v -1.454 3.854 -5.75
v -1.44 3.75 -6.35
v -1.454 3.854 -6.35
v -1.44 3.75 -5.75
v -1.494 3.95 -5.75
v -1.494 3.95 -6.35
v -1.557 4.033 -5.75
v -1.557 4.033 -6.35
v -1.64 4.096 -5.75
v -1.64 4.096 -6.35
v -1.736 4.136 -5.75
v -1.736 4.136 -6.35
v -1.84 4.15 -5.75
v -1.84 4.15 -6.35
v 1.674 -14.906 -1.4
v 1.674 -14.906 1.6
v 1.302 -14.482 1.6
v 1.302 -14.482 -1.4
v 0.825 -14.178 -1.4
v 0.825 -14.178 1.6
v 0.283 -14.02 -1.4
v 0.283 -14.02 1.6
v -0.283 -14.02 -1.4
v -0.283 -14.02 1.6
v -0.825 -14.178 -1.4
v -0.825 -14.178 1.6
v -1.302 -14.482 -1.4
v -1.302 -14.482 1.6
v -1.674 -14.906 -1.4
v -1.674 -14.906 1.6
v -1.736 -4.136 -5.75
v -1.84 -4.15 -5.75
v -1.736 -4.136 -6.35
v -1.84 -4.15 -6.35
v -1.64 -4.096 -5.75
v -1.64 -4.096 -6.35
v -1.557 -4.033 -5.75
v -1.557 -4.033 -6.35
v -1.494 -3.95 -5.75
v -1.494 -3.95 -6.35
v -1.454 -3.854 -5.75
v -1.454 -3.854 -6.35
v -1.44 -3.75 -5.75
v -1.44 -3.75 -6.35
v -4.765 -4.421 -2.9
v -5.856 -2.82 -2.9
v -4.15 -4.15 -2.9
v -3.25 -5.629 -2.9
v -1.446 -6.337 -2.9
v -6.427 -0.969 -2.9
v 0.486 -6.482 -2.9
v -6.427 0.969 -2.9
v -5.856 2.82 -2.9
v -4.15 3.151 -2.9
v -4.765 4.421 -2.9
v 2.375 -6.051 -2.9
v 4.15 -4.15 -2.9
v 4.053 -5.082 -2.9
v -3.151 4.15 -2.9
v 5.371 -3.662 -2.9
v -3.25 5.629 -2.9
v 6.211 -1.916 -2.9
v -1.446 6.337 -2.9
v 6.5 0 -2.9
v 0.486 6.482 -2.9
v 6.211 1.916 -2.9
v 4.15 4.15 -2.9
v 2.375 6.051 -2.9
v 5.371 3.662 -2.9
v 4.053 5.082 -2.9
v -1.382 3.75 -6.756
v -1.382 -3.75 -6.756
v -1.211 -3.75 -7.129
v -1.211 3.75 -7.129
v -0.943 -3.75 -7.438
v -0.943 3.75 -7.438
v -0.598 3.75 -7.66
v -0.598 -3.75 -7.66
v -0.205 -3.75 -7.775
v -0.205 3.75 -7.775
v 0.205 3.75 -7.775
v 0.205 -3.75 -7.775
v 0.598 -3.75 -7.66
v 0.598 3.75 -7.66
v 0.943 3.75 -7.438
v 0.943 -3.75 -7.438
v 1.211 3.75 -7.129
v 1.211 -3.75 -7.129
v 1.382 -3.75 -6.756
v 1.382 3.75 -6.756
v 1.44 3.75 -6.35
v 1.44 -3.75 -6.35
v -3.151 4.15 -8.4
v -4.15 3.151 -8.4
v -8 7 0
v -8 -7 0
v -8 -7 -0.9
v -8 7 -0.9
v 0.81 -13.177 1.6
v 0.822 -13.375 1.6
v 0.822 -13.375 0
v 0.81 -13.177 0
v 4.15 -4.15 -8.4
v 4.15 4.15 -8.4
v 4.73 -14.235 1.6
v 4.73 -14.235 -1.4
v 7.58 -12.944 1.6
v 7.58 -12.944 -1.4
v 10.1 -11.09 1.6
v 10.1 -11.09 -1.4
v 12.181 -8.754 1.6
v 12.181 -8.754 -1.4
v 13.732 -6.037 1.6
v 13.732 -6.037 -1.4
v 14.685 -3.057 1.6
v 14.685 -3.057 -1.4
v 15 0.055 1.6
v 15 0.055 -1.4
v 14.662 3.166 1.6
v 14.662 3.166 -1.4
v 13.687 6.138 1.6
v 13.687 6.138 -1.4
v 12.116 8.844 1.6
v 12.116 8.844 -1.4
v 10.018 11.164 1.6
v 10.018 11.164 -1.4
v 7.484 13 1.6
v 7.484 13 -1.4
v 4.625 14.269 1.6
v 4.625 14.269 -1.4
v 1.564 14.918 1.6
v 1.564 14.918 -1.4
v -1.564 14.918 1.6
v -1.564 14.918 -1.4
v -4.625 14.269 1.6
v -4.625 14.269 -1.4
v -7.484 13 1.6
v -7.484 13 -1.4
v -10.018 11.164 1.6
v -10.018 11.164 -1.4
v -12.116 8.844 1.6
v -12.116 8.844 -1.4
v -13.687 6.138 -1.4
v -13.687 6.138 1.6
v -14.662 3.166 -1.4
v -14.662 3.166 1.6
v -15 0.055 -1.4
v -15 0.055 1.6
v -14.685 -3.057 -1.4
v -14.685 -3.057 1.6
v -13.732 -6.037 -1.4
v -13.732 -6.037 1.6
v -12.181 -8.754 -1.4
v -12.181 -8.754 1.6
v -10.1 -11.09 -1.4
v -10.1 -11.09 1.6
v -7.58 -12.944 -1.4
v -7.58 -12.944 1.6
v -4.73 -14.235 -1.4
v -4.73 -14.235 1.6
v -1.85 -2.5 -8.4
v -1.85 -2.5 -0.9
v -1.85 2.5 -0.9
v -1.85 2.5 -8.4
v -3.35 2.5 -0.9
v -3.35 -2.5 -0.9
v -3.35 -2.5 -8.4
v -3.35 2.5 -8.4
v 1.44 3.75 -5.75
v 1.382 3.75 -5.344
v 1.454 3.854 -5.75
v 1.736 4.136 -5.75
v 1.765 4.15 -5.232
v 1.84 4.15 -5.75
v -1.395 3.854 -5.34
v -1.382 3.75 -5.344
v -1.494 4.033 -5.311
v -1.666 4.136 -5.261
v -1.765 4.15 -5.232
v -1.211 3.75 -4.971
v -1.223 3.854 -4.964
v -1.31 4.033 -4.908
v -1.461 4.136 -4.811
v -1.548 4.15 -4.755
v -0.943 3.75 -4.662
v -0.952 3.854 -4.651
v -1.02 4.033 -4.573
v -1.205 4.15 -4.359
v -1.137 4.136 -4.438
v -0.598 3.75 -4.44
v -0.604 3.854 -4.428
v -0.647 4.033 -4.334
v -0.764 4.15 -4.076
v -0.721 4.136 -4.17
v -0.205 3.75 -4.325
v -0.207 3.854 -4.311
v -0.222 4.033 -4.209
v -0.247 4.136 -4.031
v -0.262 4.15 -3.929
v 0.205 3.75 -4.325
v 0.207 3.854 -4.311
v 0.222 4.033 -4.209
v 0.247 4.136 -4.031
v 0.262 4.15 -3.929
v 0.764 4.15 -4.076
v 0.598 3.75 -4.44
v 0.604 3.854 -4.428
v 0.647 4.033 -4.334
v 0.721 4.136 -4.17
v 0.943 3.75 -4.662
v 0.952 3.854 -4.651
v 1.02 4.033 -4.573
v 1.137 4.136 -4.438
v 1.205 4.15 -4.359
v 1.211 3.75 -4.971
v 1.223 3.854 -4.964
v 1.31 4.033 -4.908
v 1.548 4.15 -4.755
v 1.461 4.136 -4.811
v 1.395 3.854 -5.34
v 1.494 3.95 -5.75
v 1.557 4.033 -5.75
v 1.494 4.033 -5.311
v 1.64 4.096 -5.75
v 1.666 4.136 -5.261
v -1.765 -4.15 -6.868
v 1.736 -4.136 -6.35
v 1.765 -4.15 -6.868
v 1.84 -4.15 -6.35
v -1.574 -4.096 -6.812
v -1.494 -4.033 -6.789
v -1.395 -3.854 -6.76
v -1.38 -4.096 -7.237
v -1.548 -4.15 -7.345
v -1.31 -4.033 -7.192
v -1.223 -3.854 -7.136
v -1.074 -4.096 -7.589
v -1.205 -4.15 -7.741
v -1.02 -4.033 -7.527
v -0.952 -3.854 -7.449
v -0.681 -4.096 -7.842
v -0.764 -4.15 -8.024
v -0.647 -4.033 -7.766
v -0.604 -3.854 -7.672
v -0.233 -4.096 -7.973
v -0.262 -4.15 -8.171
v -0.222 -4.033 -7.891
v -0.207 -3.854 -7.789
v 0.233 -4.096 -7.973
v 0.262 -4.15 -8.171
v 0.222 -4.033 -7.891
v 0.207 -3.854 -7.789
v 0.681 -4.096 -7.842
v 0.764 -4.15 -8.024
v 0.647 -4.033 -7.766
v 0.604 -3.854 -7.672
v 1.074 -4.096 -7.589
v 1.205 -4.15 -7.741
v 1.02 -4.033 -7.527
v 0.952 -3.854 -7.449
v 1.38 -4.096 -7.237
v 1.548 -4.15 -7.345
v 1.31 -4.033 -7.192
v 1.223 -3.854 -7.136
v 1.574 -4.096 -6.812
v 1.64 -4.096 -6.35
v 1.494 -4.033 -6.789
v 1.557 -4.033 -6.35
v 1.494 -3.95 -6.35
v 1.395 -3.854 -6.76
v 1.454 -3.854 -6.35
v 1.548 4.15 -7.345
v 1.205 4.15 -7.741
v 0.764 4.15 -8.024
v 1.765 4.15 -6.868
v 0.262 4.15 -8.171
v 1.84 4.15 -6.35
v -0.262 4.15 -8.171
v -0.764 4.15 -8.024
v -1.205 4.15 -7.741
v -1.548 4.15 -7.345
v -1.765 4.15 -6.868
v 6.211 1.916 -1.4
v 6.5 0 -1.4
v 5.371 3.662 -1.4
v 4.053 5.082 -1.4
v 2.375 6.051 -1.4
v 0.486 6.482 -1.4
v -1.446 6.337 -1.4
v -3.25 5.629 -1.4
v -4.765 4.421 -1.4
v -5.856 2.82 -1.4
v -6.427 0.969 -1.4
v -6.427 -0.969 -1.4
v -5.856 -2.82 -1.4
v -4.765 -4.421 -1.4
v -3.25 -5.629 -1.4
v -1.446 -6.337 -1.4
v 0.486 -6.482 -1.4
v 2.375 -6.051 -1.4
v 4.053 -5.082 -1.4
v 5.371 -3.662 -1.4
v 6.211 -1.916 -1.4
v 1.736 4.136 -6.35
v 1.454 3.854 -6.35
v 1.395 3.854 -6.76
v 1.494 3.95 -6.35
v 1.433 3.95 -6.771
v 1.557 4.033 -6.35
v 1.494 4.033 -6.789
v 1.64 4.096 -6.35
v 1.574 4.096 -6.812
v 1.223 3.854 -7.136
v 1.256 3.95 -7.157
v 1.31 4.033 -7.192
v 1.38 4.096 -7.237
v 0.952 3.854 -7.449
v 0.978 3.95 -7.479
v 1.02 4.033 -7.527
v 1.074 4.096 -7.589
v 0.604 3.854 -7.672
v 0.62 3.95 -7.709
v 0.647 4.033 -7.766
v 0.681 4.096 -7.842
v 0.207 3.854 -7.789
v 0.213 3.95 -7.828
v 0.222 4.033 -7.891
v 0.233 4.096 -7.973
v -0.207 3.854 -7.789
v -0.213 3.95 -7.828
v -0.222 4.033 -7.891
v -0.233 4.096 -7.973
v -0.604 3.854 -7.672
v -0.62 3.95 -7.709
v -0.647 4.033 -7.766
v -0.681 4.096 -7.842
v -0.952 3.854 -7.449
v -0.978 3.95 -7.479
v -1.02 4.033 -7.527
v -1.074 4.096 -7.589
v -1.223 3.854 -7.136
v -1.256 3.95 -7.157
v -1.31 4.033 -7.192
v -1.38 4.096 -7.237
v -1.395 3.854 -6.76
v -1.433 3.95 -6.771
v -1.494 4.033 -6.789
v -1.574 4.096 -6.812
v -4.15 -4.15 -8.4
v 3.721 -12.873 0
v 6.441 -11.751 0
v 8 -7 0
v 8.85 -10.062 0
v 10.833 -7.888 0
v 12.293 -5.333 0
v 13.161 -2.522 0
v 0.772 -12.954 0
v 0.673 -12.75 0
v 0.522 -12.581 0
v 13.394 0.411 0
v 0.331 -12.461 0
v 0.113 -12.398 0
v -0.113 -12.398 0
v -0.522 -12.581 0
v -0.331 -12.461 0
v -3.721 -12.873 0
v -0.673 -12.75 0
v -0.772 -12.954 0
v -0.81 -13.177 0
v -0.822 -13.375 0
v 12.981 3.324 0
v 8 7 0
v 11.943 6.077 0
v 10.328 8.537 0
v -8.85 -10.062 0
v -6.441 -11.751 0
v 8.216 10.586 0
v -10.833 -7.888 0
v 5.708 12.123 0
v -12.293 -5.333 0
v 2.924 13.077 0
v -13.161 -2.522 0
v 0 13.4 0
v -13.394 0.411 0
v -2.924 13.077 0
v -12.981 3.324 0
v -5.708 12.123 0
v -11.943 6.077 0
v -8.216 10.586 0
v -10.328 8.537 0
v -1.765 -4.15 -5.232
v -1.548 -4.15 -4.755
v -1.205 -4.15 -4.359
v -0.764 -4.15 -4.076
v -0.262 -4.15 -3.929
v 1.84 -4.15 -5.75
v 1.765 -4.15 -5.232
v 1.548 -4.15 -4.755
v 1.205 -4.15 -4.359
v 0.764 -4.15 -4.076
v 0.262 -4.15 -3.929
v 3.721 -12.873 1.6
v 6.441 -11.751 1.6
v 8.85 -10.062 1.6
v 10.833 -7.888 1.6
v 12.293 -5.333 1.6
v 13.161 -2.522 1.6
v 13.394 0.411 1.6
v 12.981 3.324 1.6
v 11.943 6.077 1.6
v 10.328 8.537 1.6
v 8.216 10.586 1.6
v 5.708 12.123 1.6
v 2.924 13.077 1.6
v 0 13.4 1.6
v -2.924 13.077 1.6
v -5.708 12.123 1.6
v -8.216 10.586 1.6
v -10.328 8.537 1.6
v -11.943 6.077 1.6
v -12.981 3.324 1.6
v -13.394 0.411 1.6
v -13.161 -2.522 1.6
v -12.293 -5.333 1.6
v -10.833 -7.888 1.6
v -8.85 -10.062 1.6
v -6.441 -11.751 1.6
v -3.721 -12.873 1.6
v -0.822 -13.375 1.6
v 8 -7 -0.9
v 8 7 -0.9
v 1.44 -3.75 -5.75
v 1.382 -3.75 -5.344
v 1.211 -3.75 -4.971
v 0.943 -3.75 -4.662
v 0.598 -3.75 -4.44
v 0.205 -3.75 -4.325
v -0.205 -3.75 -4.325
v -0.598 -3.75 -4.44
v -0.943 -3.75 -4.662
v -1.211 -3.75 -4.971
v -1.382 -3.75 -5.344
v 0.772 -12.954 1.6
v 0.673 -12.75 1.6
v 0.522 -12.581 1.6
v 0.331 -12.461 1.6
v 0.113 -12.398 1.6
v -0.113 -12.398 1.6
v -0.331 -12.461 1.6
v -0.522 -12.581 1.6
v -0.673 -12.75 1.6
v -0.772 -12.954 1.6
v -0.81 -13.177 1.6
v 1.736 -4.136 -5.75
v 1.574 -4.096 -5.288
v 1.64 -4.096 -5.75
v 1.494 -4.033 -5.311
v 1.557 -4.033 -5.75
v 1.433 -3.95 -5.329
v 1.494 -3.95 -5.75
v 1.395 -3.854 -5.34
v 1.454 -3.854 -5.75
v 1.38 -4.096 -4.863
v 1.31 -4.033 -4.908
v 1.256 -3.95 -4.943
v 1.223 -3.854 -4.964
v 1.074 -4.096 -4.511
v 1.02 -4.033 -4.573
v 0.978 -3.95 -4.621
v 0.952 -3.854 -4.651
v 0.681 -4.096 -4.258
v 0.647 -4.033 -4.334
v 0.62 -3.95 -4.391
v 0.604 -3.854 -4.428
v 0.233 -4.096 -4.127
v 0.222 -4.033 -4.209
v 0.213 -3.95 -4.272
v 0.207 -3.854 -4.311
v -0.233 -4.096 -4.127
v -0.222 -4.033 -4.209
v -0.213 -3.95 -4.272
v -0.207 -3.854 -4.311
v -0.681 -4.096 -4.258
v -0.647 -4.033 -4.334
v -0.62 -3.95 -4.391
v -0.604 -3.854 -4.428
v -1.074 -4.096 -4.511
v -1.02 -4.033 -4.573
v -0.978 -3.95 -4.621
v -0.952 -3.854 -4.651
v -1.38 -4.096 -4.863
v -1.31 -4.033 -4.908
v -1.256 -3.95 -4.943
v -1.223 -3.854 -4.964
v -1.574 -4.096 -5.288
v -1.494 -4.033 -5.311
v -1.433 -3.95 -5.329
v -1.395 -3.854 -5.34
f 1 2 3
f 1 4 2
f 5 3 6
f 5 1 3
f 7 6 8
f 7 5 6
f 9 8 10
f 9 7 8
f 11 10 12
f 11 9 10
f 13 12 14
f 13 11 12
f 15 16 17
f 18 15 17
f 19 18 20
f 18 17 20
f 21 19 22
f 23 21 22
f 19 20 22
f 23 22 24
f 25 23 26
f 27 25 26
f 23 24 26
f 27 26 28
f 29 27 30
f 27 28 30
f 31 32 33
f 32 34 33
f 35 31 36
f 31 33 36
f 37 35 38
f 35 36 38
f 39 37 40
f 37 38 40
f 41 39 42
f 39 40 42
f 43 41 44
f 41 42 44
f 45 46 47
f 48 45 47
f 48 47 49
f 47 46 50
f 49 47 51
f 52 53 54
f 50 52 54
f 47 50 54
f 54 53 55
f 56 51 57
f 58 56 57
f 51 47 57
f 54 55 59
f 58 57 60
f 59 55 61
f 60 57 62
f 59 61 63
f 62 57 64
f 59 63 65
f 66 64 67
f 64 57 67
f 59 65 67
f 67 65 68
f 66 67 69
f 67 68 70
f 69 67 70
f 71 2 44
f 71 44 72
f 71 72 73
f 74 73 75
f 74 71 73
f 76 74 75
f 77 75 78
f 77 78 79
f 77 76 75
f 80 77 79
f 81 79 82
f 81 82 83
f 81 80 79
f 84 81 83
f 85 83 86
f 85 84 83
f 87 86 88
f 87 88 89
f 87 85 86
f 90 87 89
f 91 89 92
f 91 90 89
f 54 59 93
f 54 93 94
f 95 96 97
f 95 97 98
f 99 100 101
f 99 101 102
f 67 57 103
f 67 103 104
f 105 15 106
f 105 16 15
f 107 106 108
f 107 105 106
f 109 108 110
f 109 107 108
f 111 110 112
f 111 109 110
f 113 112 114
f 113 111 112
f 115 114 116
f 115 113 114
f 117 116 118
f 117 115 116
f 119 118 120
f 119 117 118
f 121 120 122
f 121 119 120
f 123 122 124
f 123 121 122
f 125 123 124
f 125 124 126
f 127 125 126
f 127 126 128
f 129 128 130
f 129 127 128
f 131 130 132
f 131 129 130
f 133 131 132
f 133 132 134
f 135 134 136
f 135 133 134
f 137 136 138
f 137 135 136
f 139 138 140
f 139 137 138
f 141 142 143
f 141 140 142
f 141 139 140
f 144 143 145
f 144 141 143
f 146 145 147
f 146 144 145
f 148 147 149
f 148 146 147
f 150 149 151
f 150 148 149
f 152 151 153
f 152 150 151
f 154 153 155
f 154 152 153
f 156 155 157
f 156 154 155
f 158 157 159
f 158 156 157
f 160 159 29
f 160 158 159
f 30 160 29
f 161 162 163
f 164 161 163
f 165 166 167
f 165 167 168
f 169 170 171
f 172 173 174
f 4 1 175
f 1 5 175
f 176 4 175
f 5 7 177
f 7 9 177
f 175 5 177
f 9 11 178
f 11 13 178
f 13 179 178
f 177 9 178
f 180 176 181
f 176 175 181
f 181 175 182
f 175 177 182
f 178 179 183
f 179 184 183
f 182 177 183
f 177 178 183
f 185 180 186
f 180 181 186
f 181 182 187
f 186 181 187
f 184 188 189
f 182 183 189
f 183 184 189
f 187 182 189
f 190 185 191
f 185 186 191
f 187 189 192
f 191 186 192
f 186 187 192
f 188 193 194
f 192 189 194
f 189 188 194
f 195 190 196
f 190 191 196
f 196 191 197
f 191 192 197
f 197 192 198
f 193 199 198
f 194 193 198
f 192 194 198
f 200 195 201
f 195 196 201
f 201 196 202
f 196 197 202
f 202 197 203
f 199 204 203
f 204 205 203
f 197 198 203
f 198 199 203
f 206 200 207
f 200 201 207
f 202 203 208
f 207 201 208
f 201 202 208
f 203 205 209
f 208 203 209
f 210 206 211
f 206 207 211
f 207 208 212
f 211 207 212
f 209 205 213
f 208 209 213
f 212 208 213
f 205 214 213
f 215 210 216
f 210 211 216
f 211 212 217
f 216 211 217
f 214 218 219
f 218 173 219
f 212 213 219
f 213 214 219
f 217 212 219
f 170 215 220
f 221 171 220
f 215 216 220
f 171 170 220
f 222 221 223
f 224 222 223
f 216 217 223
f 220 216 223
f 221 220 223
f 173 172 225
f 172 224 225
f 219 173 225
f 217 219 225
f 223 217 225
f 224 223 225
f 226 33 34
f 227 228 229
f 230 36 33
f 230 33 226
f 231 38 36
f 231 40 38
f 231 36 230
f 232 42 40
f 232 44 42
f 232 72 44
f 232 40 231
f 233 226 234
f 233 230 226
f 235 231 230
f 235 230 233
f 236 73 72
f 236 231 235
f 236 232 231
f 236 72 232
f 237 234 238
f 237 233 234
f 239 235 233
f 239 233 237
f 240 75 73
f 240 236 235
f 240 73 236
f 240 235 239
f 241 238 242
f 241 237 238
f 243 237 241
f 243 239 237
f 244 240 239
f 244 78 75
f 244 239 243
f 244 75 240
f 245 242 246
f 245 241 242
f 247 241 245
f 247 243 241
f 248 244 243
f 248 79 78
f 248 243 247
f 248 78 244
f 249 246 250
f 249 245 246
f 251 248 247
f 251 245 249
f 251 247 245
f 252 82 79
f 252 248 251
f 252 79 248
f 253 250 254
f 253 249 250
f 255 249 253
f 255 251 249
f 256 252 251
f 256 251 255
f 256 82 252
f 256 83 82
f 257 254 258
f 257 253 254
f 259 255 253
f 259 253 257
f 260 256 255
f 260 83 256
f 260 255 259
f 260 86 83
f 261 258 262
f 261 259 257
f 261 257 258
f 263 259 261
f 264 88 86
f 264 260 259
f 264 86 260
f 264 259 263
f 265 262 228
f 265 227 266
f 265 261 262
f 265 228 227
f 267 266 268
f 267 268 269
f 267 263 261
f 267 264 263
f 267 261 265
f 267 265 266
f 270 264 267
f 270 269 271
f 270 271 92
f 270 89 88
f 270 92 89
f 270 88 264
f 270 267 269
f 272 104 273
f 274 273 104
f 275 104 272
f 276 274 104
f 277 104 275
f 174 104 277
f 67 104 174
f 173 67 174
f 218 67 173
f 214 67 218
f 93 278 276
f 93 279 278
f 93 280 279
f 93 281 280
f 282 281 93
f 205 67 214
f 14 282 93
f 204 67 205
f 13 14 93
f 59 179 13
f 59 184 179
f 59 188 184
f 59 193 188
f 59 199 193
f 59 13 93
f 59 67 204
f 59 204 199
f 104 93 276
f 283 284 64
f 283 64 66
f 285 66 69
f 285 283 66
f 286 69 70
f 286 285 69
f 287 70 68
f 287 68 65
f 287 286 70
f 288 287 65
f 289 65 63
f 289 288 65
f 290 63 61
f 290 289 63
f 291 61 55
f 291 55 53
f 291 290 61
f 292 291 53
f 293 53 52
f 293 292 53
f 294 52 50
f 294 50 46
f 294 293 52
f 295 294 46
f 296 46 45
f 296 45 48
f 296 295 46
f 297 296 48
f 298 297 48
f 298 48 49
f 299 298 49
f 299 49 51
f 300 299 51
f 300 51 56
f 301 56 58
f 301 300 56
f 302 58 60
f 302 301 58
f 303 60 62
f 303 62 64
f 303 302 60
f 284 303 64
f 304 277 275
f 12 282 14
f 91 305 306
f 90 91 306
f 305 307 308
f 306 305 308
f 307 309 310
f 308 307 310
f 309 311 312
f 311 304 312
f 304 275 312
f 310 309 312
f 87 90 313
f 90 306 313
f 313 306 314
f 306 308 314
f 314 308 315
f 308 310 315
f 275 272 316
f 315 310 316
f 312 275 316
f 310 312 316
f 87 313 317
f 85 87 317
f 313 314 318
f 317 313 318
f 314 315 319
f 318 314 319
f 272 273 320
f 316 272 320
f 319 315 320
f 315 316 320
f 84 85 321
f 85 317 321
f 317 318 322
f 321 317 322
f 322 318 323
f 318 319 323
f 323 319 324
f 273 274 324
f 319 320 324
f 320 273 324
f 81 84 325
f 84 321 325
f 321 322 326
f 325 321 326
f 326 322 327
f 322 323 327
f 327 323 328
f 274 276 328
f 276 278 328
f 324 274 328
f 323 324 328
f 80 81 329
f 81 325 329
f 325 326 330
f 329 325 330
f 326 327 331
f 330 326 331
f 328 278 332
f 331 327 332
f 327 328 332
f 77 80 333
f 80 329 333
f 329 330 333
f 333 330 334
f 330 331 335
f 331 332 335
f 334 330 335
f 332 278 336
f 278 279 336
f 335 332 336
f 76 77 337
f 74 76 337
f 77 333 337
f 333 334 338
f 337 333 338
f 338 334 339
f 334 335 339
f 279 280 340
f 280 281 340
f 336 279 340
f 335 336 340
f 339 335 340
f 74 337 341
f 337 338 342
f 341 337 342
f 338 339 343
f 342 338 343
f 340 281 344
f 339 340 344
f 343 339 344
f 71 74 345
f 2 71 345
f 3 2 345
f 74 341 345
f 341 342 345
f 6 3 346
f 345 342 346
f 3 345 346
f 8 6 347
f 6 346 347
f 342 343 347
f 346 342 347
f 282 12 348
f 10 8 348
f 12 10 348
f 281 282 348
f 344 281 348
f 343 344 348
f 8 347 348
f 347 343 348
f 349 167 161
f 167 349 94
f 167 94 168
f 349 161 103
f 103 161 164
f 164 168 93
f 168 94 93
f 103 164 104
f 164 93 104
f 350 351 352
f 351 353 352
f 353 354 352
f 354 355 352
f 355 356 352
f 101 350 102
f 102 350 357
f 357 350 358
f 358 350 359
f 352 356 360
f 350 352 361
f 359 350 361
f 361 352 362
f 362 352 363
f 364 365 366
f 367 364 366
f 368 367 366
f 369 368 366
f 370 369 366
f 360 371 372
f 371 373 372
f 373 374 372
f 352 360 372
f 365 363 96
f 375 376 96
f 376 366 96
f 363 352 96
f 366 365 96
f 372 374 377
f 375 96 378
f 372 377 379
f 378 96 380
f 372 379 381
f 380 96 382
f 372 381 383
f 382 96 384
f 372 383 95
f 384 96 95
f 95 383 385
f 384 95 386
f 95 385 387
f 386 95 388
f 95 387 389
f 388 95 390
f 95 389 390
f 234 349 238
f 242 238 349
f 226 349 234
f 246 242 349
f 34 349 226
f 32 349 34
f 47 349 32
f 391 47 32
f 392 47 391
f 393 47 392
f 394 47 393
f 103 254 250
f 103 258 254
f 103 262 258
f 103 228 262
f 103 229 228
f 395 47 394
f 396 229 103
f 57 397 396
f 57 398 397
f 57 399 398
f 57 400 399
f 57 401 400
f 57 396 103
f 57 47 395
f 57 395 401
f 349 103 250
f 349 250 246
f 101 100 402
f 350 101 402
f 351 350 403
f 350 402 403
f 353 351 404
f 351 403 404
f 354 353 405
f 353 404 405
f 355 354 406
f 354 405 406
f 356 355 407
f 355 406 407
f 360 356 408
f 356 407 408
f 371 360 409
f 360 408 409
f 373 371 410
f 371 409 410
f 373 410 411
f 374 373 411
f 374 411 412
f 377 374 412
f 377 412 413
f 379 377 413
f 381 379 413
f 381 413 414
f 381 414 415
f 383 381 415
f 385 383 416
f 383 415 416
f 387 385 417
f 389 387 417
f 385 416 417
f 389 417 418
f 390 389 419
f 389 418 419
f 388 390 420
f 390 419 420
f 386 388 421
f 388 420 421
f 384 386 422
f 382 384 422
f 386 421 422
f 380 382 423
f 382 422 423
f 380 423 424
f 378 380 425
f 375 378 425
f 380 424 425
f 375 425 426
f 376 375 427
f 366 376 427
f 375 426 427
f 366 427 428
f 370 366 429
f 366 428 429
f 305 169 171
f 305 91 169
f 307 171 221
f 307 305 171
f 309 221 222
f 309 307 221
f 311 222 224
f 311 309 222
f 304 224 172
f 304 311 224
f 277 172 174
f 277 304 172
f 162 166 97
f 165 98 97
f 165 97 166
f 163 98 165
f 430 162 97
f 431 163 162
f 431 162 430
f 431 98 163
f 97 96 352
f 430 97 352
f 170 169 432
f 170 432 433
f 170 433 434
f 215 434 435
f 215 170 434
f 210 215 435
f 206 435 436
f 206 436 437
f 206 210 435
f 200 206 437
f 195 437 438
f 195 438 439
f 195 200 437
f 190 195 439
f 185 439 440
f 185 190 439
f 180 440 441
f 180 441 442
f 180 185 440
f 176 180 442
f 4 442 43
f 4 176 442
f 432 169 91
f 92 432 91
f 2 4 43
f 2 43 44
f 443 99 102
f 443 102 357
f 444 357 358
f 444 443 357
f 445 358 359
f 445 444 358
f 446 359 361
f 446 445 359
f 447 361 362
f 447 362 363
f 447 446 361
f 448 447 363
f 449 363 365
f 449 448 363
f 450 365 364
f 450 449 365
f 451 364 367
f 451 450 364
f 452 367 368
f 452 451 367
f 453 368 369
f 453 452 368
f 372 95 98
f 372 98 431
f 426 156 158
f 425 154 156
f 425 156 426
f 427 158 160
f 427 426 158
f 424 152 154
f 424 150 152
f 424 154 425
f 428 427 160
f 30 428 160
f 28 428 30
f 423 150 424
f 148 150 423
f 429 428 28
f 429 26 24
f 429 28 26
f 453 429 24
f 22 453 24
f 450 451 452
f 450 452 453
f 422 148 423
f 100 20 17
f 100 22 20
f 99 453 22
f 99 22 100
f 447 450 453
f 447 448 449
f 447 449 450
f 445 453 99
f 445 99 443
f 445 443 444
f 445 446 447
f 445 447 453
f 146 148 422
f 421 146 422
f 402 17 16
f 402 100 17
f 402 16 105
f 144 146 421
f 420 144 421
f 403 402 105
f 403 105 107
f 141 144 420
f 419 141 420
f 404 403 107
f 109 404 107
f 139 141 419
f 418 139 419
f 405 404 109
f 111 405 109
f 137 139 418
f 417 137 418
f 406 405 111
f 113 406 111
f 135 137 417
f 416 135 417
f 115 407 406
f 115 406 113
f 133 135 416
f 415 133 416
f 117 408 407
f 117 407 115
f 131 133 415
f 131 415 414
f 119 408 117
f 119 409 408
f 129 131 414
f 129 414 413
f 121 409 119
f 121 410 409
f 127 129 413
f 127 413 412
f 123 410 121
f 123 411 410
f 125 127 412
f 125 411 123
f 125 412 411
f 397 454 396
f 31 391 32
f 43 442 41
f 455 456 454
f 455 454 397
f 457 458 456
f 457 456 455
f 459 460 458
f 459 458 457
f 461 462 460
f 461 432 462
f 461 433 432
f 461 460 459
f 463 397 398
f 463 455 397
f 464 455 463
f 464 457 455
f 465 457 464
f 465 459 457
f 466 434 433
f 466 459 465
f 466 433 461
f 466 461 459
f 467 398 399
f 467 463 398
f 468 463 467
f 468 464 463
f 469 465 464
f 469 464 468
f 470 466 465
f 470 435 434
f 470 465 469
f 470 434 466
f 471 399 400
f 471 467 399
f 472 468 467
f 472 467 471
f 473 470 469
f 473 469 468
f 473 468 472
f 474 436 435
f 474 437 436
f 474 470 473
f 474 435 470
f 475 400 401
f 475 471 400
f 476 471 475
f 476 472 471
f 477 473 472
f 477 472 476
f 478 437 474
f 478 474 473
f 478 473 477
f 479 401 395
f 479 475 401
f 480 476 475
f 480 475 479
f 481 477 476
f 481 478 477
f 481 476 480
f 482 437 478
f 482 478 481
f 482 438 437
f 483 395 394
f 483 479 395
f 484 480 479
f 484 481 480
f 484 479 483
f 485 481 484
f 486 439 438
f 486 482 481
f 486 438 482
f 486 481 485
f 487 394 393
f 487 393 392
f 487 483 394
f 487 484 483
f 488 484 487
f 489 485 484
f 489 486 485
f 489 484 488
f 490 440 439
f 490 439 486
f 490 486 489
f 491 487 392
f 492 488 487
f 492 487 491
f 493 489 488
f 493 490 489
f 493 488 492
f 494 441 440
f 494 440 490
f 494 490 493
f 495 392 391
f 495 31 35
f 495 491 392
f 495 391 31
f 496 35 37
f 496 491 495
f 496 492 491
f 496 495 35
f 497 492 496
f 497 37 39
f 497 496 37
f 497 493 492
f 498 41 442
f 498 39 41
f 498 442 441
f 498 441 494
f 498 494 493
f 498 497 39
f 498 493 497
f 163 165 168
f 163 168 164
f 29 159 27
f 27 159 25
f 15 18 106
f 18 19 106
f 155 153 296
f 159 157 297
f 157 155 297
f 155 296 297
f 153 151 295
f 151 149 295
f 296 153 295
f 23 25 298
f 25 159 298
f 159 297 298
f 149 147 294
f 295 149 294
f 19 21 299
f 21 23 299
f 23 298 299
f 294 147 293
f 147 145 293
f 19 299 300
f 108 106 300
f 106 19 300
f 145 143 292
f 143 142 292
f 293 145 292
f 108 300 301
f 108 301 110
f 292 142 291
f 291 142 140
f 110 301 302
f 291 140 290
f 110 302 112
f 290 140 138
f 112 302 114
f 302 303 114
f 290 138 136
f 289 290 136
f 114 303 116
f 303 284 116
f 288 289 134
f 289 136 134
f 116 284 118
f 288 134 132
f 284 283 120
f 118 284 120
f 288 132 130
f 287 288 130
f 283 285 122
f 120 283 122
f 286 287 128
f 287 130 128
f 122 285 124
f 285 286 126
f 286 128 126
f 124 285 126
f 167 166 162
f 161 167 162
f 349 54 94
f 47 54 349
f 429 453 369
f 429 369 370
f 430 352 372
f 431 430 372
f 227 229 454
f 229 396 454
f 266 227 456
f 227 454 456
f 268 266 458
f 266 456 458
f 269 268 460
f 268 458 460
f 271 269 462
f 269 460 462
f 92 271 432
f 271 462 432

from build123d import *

# Parameters (mm, degrees)
SKETCH012_R     = 15
PAD002_DEPTH    = 3
POCKET004_DEPTH = 1.6
SKETCH013_W     = 16
SKETCH013_H     = 14
POCKET005_DEPTH = 2.5
PAD003_DEPTH    = 7
SKETCH015_R     = 6.5
PAD004_DEPTH    = 1.5
SKETCH016_W     = 1.5
SKETCH016_H     = 5
POCKET006_DEPTH = 10.001
POCKET013_DEPTH = 10.001
POCKET015_DEPTH = 34.90725
FILLET_R        = 0.4
FILLET002_R     = 0.4


with BuildPart() as part:
    # Sketch012 → Pad002 (new body)
    with BuildSketch(Plane.XY):
        with Locations((-60, -20)):
            Circle(SKETCH012_R)
    extrude(amount=-PAD002_DEPTH)

    # Sketch011 → Pocket004 (cut)
    with BuildSketch(Plane.XY):
        with BuildLine():
            ThreePointArc((-59.190336, -33.176677), (-60, -32.39), (-60.809664, -33.176677))
            Line((-60.809664, -33.176677), (-60.821837, -33.374774))
            ThreePointArc((-59.178163, -33.374774), (-60, -6.6), (-60.821837, -33.374774))
            Line((-59.178163, -33.374774), (-59.190336, -33.176677))
        make_face()
    extrude(amount=-POCKET004_DEPTH, mode=Mode.SUBTRACT)

    # Sketch013 → Pocket005 (cut)
    with BuildSketch(Plane.XY):
        with Locations((-60, -20)):
            Rectangle(SKETCH013_W, SKETCH013_H)
    extrude(amount=-POCKET005_DEPTH, mode=Mode.SUBTRACT)

    # Sketch014 → Pad003 (join)
    with BuildSketch(Plane.XY.offset(-3)):
        Polygon((-64.15, -24.15), (-55.85, -24.15), (-55.85, -15.85), (-63.150934, -15.85), (-64.15, -16.849066), align=None)
    extrude(amount=-PAD003_DEPTH)

    # Sketch015 → Pad004 (join)
    with BuildSketch(Plane.XY.offset(-3)):
        with Locations((-60, -20)):
            Circle(SKETCH015_R)
    extrude(amount=-PAD004_DEPTH)

    # Sketch016 → Pocket006 (cut, through all)
    with BuildSketch(Plane.XY):
        with Locations((-62.6, -20)):
            Rectangle(SKETCH016_W, SKETCH016_H)
    extrude(amount=-POCKET006_DEPTH, mode=Mode.SUBTRACT)

    # Sketch025 → Pocket013 (cut, through all)
    with BuildSketch(Plane.XY):
        with BuildLine():
            ThreePointArc((-58.325571, -34.90625), (-60, -34), (-61.674429, -34.90625))
            ThreePointArc((-61.674429, -34.90625), (-60, -35), (-58.325571, -34.90625))
        make_face()
    extrude(amount=-POCKET013_DEPTH, mode=Mode.SUBTRACT)

    # Sketch028 → Pocket015 (cut, through all)
    with BuildSketch(Plane.XZ):
        with BuildLine():
            Line((-58.56, -7.35), (-58.56, -7.95))
            ThreePointArc((-61.44, -7.95), (-60, -9.39), (-58.56, -7.95))
            Line((-61.44, -7.35), (-61.44, -7.95))
            ThreePointArc((-58.56, -7.35), (-60, -5.91), (-61.44, -7.35))
        make_face()
    extrude(amount=POCKET015_DEPTH, mode=Mode.SUBTRACT)

    # Fillet
    fillet_edges = [part.edges().sort_by_distance(p)[0] for p in [
        (-58.56, -24.15, -7.65),
    ]]
    fillet(fillet_edges, radius=FILLET_R)

    # Fillet002
    fillet002_edges = [part.edges().sort_by_distance(p)[0] for p in [
        (-58.56, -15.85, -7.65),
    ]]
    fillet(fillet002_edges, radius=FILLET002_R)


with BuildPart() as part_1:
    # Body001 placement: moved
    add(part.part.moved(Location((60, 20, 1.6))))


solid = part_1.part
